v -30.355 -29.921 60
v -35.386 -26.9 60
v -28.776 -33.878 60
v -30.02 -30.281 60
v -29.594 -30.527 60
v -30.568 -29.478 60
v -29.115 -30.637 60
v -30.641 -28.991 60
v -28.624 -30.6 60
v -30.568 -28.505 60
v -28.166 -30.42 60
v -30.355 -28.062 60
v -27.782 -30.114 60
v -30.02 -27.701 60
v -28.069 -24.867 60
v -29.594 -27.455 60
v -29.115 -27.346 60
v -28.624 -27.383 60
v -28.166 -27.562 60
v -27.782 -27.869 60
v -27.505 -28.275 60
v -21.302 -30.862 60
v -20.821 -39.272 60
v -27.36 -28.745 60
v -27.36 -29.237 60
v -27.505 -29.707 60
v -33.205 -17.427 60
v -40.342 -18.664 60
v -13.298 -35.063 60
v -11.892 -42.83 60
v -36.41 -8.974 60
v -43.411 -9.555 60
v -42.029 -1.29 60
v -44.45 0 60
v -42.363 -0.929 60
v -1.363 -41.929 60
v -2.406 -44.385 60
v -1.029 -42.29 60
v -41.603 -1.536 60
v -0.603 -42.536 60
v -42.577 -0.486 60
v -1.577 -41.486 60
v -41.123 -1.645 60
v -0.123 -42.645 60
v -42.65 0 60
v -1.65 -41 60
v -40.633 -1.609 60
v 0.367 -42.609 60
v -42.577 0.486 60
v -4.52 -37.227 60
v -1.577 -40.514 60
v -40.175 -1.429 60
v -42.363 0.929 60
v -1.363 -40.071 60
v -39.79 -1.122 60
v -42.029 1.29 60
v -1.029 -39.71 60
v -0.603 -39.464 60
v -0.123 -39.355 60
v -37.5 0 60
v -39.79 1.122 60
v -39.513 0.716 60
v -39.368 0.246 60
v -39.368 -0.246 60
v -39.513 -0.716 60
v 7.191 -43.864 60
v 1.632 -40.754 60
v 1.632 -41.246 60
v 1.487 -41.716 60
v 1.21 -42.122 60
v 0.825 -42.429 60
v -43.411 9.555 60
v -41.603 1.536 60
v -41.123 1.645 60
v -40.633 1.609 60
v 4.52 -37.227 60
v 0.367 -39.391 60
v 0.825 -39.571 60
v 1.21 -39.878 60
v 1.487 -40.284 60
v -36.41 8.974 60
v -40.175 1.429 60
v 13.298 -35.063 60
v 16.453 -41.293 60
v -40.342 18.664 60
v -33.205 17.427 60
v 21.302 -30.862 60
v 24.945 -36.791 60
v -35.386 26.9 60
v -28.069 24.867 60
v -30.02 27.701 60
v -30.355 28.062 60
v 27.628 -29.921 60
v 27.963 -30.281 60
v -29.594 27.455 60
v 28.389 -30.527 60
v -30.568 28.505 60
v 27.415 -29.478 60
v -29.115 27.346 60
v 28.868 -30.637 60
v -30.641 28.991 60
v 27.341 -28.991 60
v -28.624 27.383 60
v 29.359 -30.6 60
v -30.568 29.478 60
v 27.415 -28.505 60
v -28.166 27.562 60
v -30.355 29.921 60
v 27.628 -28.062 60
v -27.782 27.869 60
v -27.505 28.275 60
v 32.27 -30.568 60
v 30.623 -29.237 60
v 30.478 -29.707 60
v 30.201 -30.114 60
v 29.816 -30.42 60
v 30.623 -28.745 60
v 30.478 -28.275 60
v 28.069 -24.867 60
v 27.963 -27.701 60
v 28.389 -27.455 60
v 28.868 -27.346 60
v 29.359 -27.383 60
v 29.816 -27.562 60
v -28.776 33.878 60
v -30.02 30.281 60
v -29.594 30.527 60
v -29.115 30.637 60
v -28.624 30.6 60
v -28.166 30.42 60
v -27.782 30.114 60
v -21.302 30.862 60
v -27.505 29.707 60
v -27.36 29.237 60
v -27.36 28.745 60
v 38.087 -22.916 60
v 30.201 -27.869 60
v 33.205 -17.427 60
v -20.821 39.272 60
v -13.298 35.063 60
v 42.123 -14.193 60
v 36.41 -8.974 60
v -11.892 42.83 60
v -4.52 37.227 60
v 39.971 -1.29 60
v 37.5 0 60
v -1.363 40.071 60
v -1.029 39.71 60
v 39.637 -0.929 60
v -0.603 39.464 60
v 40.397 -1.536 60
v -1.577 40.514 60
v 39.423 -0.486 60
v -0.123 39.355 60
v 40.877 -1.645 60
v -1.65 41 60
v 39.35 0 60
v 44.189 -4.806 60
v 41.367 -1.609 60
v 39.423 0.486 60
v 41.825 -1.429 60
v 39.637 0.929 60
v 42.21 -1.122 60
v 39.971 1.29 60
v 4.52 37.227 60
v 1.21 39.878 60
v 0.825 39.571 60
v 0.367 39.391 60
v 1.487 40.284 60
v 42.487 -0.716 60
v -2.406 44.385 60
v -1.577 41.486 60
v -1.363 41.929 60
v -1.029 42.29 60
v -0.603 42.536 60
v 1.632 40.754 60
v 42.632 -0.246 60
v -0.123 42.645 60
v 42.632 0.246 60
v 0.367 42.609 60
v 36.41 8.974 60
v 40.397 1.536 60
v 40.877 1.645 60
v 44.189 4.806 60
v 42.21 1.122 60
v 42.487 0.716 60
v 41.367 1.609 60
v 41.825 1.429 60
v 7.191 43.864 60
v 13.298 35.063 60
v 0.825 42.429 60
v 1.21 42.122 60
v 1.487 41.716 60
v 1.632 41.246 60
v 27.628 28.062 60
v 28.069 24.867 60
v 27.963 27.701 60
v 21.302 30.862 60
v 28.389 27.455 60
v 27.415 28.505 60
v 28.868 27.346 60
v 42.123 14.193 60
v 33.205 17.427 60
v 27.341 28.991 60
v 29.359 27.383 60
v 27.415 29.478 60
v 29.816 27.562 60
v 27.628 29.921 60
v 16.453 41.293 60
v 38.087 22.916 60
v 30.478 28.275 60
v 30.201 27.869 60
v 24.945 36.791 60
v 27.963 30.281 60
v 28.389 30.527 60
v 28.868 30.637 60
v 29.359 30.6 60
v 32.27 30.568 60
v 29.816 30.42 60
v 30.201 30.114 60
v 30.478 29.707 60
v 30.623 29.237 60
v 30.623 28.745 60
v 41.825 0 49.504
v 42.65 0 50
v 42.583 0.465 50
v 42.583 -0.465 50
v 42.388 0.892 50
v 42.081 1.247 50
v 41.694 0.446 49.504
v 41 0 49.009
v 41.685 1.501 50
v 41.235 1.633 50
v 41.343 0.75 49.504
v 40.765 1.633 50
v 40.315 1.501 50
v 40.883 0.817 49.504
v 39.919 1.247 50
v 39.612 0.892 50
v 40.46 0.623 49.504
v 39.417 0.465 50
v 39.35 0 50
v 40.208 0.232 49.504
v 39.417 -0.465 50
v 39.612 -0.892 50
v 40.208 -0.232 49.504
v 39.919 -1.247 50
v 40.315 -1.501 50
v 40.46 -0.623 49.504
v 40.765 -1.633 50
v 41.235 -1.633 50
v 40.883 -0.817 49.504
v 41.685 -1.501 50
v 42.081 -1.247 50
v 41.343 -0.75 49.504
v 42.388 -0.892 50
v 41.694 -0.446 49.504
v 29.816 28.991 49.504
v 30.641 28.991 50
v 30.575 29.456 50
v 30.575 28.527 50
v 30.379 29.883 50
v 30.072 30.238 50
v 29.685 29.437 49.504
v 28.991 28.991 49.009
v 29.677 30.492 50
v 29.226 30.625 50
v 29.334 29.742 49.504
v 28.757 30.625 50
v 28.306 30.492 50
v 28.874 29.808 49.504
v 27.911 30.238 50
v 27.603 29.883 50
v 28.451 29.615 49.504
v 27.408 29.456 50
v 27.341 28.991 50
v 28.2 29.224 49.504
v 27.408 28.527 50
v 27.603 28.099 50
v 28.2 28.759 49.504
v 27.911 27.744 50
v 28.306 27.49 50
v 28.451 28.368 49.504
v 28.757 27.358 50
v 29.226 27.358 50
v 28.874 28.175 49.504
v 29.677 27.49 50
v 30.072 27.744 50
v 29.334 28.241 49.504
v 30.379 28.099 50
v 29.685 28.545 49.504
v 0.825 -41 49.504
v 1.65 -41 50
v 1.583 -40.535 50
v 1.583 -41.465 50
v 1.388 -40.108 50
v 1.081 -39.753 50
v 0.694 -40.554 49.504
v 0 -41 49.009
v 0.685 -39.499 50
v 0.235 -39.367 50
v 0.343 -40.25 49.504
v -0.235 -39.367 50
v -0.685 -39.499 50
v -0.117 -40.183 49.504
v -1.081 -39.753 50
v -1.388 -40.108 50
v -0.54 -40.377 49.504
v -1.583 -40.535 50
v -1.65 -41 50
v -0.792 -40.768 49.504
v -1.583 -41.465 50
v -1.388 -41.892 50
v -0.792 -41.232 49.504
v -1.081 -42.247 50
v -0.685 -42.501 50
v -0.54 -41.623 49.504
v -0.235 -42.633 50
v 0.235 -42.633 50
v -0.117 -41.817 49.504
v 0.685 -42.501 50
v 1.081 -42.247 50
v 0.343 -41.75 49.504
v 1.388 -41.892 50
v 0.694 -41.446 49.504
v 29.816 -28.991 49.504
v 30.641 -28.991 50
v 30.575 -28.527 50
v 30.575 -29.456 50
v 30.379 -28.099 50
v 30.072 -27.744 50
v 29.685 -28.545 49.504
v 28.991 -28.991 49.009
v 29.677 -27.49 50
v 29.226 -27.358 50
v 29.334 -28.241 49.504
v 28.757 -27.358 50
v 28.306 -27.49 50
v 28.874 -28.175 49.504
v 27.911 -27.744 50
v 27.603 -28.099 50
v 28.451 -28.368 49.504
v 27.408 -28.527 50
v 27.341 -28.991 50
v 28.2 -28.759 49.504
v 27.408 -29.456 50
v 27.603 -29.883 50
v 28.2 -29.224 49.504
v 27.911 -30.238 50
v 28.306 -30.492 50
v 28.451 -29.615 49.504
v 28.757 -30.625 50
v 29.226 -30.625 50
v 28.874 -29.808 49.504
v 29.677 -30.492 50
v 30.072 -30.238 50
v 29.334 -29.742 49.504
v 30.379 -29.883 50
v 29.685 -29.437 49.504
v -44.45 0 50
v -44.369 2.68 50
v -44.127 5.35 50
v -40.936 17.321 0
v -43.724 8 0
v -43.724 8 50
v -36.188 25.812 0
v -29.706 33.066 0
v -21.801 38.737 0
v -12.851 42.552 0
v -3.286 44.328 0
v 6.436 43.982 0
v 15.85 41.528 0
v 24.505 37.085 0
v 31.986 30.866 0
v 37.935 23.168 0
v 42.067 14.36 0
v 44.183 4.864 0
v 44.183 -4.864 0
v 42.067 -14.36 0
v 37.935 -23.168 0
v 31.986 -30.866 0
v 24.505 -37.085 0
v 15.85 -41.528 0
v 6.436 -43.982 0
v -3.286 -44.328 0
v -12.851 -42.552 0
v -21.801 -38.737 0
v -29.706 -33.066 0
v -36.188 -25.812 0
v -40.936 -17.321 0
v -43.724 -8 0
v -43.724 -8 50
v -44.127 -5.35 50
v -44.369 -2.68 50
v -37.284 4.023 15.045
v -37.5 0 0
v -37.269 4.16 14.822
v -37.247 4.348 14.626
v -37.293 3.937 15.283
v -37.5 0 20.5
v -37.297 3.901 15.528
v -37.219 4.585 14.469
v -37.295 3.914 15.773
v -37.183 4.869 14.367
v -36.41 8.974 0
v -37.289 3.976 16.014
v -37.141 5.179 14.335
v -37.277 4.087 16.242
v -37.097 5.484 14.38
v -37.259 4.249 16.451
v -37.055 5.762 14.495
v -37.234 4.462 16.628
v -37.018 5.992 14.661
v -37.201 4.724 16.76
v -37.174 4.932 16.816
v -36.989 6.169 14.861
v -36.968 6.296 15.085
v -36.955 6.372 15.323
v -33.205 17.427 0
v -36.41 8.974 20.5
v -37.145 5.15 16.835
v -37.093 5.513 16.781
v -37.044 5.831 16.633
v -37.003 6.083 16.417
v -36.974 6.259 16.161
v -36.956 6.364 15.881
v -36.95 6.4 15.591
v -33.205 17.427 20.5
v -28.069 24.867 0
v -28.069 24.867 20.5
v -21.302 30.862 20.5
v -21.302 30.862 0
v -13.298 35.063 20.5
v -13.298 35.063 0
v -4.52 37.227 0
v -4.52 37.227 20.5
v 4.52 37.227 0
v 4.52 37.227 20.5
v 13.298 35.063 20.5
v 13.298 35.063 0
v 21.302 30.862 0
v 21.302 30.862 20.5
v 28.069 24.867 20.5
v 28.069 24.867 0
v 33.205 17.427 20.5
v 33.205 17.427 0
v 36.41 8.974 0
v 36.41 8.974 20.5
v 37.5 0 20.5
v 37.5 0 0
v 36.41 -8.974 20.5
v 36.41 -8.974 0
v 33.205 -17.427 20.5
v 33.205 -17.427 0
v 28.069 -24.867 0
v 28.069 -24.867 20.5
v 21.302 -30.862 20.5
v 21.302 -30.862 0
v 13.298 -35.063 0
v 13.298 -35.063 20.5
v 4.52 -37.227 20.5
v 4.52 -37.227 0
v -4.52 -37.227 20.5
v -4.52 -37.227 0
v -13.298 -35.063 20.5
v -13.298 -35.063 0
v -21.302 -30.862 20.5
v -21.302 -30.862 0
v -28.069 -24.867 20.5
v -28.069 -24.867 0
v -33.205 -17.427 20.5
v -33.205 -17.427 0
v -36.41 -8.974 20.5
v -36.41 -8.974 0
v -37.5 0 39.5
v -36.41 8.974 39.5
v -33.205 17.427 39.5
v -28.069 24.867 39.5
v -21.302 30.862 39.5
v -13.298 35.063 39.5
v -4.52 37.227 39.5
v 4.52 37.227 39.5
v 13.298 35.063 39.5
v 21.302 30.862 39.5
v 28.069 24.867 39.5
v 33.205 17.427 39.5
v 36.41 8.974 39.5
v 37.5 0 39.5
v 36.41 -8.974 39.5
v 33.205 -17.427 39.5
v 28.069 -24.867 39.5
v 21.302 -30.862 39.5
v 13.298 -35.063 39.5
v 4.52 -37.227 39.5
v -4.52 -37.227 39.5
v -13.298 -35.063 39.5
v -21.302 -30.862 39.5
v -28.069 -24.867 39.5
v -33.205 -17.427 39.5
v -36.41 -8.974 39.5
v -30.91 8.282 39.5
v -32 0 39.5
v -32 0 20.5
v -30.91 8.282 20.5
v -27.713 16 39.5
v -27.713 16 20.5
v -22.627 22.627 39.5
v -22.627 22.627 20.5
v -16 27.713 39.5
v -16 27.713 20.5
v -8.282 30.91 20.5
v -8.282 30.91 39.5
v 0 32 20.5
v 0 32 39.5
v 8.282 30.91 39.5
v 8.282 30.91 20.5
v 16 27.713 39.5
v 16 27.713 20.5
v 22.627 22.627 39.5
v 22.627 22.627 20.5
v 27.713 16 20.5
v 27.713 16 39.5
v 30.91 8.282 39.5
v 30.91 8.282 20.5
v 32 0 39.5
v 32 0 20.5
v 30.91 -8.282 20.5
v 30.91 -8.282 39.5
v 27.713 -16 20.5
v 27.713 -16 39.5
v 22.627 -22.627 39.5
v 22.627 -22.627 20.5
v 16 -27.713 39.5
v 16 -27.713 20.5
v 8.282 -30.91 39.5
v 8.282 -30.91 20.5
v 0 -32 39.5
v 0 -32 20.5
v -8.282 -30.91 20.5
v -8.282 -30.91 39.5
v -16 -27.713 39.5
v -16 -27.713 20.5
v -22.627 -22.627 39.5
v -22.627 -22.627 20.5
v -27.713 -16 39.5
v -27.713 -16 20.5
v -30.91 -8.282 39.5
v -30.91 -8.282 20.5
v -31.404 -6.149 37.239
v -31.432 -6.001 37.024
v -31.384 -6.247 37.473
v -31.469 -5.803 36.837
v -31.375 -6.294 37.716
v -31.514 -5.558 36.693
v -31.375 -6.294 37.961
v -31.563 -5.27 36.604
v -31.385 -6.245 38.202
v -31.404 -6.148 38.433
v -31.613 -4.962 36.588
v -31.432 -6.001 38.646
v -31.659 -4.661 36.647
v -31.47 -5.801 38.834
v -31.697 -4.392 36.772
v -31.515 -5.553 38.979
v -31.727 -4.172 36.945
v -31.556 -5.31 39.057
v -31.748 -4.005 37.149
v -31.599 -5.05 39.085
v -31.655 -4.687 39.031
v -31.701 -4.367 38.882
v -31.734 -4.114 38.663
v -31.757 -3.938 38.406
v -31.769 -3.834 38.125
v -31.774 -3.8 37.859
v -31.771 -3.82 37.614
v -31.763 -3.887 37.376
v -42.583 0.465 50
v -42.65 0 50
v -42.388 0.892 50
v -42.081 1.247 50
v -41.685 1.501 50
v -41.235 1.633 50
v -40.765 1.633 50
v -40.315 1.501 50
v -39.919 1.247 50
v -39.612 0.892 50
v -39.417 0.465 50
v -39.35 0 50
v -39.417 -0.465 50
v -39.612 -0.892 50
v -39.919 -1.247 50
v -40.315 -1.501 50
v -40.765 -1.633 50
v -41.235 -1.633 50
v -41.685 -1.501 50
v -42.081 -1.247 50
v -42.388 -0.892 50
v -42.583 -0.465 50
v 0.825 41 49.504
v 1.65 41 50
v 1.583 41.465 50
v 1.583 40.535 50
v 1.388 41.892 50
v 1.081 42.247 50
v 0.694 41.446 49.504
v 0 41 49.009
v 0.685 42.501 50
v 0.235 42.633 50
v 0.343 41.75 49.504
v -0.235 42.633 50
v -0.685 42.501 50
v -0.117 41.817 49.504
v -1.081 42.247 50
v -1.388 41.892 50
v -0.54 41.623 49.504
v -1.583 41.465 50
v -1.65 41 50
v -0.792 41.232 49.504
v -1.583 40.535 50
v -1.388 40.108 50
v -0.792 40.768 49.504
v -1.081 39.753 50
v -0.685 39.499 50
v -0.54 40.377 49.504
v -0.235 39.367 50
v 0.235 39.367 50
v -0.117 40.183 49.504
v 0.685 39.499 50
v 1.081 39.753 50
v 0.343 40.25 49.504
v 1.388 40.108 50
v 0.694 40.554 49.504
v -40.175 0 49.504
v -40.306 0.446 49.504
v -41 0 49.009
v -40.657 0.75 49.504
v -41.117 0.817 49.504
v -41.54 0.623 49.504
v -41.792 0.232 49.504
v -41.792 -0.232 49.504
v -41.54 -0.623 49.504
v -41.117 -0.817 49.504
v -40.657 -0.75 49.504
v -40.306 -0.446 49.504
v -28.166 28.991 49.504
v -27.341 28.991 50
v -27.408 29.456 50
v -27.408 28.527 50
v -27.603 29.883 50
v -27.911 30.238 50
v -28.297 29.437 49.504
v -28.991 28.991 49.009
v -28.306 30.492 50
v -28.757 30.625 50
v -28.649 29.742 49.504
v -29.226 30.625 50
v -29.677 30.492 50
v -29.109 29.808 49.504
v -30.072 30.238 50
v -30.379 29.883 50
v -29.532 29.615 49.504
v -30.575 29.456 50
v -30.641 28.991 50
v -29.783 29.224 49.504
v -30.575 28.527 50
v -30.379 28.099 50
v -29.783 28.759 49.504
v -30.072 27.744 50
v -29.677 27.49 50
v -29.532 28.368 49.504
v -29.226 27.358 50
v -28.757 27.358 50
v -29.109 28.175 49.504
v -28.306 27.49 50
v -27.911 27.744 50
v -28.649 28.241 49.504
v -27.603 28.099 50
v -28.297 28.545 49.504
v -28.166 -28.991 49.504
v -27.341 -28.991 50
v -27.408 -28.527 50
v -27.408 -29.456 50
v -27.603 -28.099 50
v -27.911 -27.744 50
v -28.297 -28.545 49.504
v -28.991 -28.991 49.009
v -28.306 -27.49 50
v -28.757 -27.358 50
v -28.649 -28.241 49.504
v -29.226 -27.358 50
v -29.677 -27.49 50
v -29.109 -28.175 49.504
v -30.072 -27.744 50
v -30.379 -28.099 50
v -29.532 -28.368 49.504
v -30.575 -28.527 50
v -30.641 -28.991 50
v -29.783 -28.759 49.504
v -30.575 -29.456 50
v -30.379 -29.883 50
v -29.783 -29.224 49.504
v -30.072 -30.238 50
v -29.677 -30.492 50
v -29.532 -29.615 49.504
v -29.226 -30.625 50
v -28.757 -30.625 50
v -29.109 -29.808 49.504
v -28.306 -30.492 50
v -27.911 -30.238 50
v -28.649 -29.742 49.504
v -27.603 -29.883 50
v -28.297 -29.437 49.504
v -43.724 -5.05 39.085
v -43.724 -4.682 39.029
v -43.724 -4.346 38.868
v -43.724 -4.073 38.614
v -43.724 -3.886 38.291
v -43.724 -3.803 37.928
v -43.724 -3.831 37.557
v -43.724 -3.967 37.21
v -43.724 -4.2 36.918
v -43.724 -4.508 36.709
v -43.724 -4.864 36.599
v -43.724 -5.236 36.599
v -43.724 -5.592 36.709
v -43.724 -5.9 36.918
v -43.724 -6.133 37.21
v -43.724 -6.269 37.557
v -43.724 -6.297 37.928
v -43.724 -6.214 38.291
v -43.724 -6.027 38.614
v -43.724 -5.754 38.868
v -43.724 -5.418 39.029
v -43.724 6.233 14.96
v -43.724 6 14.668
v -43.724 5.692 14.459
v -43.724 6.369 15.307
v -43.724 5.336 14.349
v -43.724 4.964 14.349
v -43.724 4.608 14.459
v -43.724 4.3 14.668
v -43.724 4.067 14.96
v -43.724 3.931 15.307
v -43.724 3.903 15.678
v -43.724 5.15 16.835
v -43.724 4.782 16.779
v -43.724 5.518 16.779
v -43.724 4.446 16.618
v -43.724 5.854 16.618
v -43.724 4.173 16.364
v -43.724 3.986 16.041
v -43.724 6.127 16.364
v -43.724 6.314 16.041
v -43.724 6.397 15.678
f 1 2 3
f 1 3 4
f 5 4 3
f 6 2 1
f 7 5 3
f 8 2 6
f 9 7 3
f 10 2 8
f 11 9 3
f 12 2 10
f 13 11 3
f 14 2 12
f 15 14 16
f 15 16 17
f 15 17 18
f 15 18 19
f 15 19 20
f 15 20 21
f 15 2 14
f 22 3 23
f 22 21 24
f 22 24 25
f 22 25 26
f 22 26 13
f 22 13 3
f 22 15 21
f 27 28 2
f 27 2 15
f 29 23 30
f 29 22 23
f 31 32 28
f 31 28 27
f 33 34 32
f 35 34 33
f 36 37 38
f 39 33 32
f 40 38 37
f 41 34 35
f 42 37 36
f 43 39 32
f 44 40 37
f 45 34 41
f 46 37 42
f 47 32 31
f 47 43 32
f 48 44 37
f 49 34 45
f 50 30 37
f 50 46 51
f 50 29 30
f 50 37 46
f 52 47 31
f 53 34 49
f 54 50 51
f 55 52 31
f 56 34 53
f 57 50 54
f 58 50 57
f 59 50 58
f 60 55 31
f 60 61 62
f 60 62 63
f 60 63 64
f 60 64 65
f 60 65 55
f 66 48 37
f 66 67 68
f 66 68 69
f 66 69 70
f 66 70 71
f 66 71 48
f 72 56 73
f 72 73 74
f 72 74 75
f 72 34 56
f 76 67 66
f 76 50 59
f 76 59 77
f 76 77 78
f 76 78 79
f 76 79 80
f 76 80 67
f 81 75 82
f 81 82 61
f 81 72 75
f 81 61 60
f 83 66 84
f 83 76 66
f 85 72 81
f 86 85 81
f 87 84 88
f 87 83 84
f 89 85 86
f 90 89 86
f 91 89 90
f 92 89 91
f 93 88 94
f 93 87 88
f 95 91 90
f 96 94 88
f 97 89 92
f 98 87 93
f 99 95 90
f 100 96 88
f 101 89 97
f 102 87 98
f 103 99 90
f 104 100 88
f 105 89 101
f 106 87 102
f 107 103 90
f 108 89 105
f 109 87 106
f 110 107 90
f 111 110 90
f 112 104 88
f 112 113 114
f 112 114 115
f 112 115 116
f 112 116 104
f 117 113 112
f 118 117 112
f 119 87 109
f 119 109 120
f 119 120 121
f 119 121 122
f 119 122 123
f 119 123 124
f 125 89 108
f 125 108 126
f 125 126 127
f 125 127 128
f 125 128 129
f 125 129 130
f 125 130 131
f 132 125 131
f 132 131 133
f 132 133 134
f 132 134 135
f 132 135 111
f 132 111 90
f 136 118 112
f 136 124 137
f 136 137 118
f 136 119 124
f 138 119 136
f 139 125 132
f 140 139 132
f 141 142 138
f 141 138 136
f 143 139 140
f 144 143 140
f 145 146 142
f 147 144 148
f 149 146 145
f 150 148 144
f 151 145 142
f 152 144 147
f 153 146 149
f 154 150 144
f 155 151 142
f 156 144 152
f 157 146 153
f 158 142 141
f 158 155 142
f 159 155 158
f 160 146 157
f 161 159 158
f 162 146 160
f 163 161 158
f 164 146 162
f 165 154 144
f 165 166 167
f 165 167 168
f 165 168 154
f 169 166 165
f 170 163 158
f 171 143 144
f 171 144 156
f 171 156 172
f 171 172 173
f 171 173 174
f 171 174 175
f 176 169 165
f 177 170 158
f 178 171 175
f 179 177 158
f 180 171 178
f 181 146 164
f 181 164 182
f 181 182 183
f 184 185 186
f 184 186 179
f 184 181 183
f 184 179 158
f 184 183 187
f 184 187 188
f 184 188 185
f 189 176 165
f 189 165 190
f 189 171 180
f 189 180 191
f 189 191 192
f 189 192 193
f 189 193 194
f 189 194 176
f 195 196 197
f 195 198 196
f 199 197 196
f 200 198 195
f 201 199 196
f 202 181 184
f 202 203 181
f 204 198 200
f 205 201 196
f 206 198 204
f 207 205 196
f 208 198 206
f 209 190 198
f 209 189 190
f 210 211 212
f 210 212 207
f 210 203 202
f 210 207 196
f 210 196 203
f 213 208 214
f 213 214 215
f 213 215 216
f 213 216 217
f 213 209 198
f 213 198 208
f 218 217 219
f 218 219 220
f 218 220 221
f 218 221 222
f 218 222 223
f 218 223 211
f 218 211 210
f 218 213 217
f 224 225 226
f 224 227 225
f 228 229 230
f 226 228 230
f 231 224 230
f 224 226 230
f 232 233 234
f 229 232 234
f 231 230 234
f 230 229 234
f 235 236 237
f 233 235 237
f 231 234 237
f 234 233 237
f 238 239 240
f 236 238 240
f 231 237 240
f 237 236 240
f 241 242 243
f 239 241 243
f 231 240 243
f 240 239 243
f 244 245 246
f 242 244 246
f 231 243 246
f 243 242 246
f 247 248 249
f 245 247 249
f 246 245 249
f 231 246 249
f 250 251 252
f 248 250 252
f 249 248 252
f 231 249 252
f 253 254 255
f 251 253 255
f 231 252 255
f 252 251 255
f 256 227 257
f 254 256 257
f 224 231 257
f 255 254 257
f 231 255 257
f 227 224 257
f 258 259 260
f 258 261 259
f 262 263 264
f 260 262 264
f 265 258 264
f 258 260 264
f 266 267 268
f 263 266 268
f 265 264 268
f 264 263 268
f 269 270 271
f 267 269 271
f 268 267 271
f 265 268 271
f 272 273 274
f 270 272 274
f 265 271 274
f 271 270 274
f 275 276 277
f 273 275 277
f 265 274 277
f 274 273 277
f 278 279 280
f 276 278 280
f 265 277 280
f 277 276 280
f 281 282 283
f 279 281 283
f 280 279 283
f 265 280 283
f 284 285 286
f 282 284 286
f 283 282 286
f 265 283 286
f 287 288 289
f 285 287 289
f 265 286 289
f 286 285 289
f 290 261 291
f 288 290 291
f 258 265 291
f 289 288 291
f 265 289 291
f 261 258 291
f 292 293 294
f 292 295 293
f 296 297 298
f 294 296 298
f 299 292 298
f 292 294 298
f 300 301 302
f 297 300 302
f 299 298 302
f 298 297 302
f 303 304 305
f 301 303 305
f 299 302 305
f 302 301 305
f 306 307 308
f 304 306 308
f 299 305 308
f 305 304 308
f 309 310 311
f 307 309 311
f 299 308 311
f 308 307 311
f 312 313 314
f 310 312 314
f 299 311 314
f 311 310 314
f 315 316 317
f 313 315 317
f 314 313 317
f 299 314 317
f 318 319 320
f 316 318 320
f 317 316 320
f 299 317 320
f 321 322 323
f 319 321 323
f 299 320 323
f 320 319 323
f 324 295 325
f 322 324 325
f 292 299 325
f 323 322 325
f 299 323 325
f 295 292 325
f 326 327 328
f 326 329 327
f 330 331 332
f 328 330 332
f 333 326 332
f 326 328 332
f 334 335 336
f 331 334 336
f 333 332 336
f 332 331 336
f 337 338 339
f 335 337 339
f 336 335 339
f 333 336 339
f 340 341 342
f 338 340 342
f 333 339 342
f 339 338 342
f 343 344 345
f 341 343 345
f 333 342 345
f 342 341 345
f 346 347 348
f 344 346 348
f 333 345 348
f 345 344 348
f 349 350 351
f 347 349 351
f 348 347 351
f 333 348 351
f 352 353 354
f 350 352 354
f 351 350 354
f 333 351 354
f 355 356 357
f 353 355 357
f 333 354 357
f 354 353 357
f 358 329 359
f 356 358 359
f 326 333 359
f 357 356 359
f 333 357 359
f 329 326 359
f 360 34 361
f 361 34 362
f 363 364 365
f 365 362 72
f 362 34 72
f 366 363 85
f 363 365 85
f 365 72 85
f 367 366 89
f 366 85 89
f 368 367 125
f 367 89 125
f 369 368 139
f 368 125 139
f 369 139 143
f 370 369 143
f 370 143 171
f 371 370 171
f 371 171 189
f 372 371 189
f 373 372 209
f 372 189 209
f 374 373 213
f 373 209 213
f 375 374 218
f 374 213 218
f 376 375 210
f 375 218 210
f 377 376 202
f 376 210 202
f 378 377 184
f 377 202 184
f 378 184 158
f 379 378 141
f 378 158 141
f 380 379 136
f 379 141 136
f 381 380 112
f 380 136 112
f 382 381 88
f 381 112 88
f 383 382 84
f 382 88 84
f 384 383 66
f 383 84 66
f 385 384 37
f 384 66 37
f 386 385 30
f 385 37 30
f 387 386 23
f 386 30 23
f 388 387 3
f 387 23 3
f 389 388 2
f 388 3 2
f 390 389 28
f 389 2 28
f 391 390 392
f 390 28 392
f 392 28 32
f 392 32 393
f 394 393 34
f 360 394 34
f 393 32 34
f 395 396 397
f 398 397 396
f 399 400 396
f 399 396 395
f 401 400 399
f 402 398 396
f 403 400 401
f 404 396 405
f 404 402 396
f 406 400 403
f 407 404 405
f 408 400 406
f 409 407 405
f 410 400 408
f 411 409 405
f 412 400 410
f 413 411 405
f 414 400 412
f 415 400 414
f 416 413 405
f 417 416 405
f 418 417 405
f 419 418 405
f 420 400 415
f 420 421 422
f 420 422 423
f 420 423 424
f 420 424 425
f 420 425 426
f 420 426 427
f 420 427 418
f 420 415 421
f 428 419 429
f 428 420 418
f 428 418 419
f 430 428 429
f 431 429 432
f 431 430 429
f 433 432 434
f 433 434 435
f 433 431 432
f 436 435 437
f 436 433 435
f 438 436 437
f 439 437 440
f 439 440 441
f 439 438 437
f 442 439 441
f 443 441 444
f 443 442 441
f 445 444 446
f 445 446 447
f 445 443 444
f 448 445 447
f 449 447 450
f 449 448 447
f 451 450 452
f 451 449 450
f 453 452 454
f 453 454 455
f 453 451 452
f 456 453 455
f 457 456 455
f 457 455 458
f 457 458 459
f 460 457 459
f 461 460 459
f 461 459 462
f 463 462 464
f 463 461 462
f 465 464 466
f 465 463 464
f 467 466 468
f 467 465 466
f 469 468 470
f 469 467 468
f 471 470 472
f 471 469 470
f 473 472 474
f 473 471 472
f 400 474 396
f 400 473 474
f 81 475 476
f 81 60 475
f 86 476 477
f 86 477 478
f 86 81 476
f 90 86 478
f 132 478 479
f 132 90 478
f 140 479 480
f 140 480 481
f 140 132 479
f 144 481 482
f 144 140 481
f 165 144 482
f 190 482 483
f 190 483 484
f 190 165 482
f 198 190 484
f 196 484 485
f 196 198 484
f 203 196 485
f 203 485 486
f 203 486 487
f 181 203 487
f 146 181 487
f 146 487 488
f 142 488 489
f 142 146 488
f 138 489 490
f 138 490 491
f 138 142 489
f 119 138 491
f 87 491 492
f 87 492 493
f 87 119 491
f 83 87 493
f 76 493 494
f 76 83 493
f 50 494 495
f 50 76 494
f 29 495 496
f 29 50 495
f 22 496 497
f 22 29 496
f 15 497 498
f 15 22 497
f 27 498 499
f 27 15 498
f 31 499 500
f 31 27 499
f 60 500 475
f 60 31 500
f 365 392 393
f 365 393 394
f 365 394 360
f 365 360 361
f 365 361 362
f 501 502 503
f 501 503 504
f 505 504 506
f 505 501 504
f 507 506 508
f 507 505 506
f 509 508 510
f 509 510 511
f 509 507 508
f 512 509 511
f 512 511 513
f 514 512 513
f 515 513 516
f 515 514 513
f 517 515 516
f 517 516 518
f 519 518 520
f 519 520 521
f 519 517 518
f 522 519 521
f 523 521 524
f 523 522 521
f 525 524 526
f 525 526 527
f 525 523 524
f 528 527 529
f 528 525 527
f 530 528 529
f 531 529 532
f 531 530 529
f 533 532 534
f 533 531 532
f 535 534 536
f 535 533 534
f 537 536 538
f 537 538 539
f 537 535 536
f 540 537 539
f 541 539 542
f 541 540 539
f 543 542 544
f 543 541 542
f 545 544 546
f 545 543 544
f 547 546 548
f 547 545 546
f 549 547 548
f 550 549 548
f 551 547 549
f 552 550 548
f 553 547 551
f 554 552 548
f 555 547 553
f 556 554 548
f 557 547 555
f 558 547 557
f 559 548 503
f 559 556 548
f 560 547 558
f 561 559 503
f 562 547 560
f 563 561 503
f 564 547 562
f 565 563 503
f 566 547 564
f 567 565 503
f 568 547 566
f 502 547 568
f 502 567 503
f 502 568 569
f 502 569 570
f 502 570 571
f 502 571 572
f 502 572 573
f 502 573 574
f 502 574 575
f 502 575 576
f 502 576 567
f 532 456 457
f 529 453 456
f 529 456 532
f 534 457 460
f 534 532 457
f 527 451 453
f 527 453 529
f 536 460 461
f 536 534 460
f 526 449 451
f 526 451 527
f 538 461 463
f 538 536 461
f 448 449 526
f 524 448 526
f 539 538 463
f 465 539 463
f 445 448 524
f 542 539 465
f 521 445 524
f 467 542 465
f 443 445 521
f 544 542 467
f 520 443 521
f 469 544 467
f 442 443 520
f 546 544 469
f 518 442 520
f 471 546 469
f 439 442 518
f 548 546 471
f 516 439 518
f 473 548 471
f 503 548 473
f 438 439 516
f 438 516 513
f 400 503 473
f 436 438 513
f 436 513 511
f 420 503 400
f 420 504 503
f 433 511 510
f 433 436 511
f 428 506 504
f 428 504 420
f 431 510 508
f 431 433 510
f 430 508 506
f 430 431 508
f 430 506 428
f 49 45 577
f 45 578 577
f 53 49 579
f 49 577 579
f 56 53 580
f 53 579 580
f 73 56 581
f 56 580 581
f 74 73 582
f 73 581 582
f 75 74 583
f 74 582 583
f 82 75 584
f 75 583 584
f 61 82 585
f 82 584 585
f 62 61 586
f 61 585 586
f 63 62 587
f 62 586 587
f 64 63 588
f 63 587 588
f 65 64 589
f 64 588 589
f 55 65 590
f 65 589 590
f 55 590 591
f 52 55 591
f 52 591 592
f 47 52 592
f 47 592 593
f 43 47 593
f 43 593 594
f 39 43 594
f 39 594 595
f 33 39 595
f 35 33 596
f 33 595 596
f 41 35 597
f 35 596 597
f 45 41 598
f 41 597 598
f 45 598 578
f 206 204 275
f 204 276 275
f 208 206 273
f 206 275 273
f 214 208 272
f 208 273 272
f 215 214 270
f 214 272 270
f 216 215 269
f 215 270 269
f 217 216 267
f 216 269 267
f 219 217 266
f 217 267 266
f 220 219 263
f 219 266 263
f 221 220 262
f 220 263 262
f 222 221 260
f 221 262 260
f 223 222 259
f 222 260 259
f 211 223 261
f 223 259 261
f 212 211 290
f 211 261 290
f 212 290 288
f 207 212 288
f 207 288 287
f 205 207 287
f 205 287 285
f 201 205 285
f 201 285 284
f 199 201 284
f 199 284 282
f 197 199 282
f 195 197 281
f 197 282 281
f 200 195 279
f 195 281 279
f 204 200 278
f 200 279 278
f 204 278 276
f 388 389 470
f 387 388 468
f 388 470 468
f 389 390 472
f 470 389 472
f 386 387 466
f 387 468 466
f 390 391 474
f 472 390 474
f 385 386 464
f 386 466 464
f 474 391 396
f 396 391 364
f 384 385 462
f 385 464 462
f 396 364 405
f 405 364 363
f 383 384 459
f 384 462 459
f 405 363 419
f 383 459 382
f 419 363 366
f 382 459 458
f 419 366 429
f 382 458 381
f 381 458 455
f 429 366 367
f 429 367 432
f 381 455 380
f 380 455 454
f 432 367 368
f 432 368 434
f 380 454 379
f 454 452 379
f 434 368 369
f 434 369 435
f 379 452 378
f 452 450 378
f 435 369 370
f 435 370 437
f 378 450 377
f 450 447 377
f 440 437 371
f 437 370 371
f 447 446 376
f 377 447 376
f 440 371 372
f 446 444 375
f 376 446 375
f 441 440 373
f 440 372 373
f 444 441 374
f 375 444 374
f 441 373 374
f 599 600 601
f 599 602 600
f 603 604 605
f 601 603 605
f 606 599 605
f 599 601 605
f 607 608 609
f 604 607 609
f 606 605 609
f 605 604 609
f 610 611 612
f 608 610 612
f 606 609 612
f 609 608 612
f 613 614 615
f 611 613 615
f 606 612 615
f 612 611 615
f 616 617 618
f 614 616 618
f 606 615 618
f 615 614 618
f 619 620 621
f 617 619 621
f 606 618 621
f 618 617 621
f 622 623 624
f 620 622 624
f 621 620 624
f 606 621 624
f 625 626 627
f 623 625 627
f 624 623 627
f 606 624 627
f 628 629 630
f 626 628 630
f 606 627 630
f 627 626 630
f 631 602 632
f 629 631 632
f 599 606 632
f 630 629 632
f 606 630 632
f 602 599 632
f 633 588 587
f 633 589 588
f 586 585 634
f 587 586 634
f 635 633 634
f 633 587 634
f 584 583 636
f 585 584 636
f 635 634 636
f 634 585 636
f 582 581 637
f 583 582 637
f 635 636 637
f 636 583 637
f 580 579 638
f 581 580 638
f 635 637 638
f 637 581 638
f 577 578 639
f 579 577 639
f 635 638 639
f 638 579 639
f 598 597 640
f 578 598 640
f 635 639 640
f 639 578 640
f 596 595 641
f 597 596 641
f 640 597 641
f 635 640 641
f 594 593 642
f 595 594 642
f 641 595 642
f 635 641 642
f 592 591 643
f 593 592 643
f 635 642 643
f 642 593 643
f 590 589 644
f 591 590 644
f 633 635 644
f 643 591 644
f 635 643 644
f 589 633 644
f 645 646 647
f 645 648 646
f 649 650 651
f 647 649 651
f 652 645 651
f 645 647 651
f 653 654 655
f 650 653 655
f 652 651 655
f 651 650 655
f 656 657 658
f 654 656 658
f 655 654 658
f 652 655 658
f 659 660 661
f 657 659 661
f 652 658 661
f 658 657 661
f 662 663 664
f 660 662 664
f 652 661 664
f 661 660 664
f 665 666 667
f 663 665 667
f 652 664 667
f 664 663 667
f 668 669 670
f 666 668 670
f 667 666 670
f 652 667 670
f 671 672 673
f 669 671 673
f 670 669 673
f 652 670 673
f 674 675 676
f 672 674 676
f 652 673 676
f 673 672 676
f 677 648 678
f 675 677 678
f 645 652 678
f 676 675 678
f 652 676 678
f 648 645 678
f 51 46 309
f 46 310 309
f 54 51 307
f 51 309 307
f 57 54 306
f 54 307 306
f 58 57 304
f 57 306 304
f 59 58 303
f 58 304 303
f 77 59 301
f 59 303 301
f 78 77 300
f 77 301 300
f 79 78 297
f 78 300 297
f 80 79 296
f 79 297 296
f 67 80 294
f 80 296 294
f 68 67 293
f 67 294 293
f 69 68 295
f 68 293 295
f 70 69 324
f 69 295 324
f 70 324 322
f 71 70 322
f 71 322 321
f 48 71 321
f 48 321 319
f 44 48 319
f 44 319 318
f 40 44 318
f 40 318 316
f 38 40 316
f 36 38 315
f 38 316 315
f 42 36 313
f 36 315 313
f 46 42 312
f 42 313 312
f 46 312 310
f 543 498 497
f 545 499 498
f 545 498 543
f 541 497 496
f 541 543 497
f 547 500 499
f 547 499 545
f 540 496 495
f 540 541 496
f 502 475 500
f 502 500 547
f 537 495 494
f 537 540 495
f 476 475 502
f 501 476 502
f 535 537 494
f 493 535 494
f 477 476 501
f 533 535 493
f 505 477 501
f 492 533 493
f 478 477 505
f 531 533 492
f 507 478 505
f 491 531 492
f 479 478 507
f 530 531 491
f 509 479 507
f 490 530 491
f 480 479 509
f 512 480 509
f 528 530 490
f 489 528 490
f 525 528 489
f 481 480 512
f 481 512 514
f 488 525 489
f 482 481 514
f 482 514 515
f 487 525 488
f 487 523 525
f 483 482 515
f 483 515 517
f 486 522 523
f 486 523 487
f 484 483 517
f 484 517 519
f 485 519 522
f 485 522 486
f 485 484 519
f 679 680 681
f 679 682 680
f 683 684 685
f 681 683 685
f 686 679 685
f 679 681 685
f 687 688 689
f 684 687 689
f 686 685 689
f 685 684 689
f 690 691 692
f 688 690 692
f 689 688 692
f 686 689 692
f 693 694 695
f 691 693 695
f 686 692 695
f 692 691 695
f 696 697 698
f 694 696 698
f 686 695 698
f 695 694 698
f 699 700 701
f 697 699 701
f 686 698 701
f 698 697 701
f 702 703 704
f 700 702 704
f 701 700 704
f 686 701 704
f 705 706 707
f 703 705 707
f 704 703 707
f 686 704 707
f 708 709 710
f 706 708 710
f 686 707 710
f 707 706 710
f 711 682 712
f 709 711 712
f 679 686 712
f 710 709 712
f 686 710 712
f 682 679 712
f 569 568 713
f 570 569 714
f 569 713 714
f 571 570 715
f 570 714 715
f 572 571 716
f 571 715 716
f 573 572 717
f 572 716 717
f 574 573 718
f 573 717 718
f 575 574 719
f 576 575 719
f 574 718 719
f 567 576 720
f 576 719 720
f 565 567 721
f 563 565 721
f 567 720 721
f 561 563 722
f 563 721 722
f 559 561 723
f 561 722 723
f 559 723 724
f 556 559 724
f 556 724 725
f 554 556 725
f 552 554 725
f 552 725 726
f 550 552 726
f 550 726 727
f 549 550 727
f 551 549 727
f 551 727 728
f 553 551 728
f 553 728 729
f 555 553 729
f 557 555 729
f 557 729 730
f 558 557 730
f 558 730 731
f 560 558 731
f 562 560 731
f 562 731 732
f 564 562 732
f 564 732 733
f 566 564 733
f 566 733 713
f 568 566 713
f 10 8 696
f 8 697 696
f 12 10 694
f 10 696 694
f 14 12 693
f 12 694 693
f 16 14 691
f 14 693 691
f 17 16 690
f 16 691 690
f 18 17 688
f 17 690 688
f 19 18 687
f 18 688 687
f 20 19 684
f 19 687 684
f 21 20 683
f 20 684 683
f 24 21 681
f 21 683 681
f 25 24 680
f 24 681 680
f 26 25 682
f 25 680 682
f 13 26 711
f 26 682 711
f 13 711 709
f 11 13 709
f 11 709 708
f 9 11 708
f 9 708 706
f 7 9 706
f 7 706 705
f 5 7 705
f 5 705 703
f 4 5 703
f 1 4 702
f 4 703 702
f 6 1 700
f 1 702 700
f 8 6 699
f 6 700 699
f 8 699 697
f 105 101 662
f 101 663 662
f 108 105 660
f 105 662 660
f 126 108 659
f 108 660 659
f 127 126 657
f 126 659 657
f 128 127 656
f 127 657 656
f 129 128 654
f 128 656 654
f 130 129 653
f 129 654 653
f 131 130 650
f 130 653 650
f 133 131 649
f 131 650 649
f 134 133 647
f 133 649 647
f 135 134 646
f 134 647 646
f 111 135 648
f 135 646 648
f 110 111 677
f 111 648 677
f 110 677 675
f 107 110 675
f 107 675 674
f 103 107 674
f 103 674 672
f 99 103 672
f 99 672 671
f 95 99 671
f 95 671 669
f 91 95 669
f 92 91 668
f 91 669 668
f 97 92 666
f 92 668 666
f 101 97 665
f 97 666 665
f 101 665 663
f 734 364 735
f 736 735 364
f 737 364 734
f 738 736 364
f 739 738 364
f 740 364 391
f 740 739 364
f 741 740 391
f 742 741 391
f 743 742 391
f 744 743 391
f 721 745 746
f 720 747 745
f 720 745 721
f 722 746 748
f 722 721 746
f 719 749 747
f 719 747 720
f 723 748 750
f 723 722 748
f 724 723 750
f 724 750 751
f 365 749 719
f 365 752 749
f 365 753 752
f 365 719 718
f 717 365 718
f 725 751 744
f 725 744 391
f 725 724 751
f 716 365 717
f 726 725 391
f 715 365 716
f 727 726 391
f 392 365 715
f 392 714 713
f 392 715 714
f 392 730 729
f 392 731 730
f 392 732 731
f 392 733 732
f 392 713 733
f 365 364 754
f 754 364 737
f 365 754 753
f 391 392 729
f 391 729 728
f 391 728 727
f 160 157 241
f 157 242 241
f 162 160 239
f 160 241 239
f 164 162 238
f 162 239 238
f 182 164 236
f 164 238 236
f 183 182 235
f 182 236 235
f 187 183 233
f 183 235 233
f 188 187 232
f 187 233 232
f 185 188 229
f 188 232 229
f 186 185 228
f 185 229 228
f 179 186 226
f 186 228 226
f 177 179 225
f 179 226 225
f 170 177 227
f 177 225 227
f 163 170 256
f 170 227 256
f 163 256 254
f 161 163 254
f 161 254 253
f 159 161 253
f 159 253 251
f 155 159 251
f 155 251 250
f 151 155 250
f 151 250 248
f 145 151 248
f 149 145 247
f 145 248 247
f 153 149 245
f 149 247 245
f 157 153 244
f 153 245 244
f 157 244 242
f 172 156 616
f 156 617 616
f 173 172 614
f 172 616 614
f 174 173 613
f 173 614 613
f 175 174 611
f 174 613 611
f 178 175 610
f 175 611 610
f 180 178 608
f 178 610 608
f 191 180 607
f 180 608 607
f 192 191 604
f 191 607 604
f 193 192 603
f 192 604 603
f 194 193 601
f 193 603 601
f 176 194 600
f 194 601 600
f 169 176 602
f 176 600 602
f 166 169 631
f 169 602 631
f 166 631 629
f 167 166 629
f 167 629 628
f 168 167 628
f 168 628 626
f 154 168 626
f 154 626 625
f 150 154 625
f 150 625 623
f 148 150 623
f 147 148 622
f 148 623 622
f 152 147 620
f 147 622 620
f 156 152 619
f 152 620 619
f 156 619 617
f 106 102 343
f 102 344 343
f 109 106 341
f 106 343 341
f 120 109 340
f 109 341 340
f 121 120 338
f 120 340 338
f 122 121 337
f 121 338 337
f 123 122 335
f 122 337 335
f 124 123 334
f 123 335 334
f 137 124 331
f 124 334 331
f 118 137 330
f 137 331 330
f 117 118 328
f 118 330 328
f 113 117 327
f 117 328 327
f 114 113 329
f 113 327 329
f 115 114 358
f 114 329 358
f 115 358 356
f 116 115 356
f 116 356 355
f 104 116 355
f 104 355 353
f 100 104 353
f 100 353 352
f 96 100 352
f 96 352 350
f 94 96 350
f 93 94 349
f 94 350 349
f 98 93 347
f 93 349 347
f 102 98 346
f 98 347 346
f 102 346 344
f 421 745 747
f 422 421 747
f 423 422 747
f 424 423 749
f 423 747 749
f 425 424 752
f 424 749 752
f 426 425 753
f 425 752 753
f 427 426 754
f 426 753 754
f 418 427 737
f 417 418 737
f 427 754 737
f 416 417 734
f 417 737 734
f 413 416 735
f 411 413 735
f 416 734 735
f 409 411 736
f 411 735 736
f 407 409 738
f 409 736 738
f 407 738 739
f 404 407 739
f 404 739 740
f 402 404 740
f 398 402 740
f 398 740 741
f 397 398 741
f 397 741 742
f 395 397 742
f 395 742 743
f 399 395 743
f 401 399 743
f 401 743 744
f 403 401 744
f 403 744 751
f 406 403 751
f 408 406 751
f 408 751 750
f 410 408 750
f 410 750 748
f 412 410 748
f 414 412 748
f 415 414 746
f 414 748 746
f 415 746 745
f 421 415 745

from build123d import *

# Parameters (mm, degrees)
SKETCH1_W                  = 44.45
SKETCH1_H                  = 60
CUT_EXTRUDE1_START         = -50
CUT_EXTRUDE1_DEPTH         = 50
M4X0_7_TAPPED_HOLE1_D      = 3.3
M4X0_7_TAPPED_HOLE1_DEPTH  = 10
M4X0_7_TAPPED_HOLE1_TIP    = 0.991420021
M3X0_5_TAPPED_HOLE1_REACH  = 117.544
M3X0_5_TAPPED_HOLE1_BORE_R = 1.25
M3X0_5_TAPPED_HOLE2_REACH  = 117.544
M3X0_5_TAPPED_HOLE2_BORE_R = 1.25


with BuildPart() as part:
    # Sketch1 → Revolve1 (revolve)
    with BuildSketch(Plane.XZ, mode=Mode.PRIVATE) as revolve1_sk:
        with Locations((22.225, 30)):
            Rectangle(SKETCH1_W, SKETCH1_H)
    revolve(revolve1_sk.sketch.rotate(Axis((0, 0, 60), (0, 0, -1)), 180), axis=Axis((0, 0, 60), (0, 0, -1)))

    # Sketch2 → Cut-Extrude1 (cut)
    with BuildSketch(Plane(origin=(0, 0, 0), x_dir=(-1, 0, 0), z_dir=(0, 0, -1)).offset(CUT_EXTRUDE1_START)):
        with BuildLine():
            Line((43.7241638, 8), (43.7241638, -8))
            ThreePointArc((43.7241638, -8), (44.45, 0), (43.7241638, 8))
        make_face()
    extrude(amount=CUT_EXTRUDE1_DEPTH, mode=Mode.SUBTRACT)

    # Sketch3 → Cut-Revolve1 (revolve, cut)
    with BuildSketch(Plane.XZ, mode=Mode.PRIVATE) as cut_revolve1_sk:
        Polygon((37.5, 60), (0, 60), (0, 0), (37.5, 0), (37.5, 20.5), (32, 20.5), (32, 39.5), (37.5, 39.5), align=None)
    revolve(cut_revolve1_sk.sketch.rotate(Axis((0, 0, 60), (0, 0, -1)), 180), axis=Axis((0, 0, 60), (0, 0, -1)), mode=Mode.SUBTRACT)

    # M4x0.7 Tapped Hole1
    with Locations(Plane.XY.offset(60)):
        with Locations((28.991378029, 28.991378029), (0, 41), (-28.991378029, 28.991378029), (-41, 0), (-28.991378029, -28.991378029), (0, -41), (28.991378029, -28.991378029), (41, 0)):
            Hole(M4X0_7_TAPPED_HOLE1_D / 2, depth=M4X0_7_TAPPED_HOLE1_DEPTH)
            with Locations((0, 0, -(M4X0_7_TAPPED_HOLE1_DEPTH + M4X0_7_TAPPED_HOLE1_TIP / 2))):  # 118° drill point
                Cone(0, M4X0_7_TAPPED_HOLE1_D / 2, M4X0_7_TAPPED_HOLE1_TIP, mode=Mode.SUBTRACT)

    # M3x0.5 Tapped Hole1 bore → M3x0.5 Tapped Hole1 (cut, up to next)
    with BuildSketch(Plane.ZY.offset(43.7241638), mode=Mode.PRIVATE) as m3x0_5_tapped_hole1_sk1:
        with Locations((15.584748033, 5.15)):
            Circle(M3X0_5_TAPPED_HOLE1_BORE_R)
    m3x0_5_tapped_hole1_tool1 = extrude(m3x0_5_tapped_hole1_sk1.sketch, amount=-M3X0_5_TAPPED_HOLE1_REACH, mode=Mode.PRIVATE) & part.part
    add(m3x0_5_tapped_hole1_tool1.solids().sort_by_distance((-43.724164, 5.15, 15.584748))[0], mode=Mode.SUBTRACT)

    # M3x0.5 Tapped Hole2 bore → M3x0.5 Tapped Hole2 (cut, up to next)
    with BuildSketch(Plane.ZY.offset(43.7241638), mode=Mode.PRIVATE) as m3x0_5_tapped_hole2_sk1:
        with Locations((37.834748033, -5.05)):
            Circle(M3X0_5_TAPPED_HOLE2_BORE_R)
    m3x0_5_tapped_hole2_tool1 = extrude(m3x0_5_tapped_hole2_sk1.sketch, amount=-M3X0_5_TAPPED_HOLE2_REACH, mode=Mode.PRIVATE) & part.part
    add(m3x0_5_tapped_hole2_tool1.solids().sort_by_distance((-43.724164, -5.05, 37.834748))[0], mode=Mode.SUBTRACT)


solid = part.part
